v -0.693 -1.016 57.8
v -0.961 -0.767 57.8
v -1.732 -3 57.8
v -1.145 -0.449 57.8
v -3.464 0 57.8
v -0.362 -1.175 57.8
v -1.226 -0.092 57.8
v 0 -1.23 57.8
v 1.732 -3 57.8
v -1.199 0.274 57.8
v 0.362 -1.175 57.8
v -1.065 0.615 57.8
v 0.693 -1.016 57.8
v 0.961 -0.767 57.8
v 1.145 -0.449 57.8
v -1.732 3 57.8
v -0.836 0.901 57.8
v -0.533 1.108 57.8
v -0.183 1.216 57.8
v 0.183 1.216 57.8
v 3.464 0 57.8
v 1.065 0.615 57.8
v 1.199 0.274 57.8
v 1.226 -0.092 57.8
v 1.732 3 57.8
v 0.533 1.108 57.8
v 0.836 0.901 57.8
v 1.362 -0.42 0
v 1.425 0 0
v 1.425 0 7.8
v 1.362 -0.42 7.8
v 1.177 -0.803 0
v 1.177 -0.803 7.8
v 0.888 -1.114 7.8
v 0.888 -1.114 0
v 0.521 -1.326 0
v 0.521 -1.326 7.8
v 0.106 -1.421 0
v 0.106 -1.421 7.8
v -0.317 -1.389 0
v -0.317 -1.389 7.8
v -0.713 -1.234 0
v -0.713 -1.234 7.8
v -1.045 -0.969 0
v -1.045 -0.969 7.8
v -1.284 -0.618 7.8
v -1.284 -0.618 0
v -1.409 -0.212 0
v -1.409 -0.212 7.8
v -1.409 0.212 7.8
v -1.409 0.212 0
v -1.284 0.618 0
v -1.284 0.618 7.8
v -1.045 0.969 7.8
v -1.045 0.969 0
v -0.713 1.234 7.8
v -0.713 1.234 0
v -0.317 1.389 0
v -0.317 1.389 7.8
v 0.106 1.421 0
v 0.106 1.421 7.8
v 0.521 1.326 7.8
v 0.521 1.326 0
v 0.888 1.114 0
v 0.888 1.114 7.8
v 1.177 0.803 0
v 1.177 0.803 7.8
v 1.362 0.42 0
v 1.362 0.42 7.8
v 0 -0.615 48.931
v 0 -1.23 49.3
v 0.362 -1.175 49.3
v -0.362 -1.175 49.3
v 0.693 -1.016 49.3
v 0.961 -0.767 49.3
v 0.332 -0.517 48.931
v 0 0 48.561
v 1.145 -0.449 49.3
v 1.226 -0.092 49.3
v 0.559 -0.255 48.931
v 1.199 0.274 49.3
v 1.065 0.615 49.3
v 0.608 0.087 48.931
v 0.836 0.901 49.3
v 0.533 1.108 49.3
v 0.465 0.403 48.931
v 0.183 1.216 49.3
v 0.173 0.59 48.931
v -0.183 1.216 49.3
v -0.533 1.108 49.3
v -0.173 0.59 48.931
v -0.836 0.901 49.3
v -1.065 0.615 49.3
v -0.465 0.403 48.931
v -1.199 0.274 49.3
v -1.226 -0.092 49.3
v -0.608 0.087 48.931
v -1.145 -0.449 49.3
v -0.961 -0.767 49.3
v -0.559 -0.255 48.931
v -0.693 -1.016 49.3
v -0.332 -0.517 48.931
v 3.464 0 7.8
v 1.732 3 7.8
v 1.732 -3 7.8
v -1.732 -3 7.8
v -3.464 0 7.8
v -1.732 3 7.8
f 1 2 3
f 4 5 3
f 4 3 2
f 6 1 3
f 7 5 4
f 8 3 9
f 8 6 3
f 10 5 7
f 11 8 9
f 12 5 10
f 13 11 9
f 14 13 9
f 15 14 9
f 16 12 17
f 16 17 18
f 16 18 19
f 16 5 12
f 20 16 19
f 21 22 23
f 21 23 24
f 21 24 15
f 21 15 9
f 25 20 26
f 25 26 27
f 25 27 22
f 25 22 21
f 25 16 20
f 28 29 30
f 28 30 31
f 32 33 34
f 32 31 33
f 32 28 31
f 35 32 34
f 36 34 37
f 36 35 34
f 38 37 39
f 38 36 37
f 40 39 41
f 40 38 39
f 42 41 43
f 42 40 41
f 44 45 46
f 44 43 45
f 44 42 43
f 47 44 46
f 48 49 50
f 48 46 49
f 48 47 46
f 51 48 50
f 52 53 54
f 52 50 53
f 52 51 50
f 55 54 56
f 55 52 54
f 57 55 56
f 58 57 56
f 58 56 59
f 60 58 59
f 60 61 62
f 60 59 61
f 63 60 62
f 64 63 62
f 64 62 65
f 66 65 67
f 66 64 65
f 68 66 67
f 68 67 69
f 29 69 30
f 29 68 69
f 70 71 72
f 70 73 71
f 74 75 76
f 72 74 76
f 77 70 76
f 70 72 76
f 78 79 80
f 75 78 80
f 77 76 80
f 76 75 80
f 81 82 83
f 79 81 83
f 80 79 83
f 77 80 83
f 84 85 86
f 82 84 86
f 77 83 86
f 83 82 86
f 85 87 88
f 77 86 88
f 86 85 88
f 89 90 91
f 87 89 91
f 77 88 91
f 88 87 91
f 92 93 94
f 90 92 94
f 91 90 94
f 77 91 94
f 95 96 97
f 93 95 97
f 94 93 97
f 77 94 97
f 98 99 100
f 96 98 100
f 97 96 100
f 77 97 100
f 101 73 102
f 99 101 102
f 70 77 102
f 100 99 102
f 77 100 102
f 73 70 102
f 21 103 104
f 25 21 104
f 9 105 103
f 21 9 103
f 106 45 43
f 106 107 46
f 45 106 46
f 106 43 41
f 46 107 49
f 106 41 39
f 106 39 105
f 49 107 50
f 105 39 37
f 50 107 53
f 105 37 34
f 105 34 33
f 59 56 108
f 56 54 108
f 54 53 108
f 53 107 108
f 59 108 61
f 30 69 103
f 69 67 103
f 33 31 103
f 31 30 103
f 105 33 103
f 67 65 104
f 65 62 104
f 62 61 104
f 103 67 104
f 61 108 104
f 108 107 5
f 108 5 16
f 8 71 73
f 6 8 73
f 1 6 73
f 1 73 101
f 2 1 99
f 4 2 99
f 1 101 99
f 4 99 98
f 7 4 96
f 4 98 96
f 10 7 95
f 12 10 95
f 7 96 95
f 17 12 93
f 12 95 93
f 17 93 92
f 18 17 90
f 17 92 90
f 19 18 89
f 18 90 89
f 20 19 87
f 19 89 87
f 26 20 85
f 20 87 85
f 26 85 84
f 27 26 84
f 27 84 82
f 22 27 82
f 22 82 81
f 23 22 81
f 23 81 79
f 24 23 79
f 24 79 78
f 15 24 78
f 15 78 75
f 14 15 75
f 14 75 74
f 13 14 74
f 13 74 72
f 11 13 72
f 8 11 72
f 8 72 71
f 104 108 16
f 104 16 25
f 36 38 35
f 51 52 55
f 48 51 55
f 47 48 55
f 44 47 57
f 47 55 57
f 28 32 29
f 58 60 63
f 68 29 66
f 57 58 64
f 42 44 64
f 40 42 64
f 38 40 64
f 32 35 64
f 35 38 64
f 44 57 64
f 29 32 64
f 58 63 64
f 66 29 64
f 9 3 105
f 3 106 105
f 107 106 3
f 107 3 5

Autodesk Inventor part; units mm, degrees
ref_plane "Plan YZ" through (0, 0, 0) normal (1, 0, 0) x (0, 1, 0)
ref_plane "Plan XZ" through (0, 0, 0) normal (0, 1, 0) x (-1, 0, 0)
ref_plane "Plan XY" through (0, 0, 0) normal (0, 0, 1) x (1, 0, 0)
sketch "Esquisse1" plane through (0, 0, 0) normal (0, 0, 1) x (1, 0, 0)
  circle A0 centre (0, 0) radius 1.425
  dimension "d0" = 2.85
extrude "Extrusion1" add sketch "Esquisse1" along normal blind 7.8
sketch "Esquisse6" plane through (0, 0, 7.8) normal (0, 0, 1) x (1, 0, 0)
  line L0 (-4.8497, 0) -> (4.8497, 0) construction
  line L1 (0, -4.2) -> (0, 4.2) construction
  line L2 (-1.7321, -3) -> (-3.4641, 0)
  line L3 (-3.4641, 0) -> (-1.7321, 3)
  line L4 (-1.7321, 3) -> (0, 3)
  line L5 (-1.7321, -3) -> (0, -3)
  line L6 (1.7321, -3) -> (3.4641, 0)
  line L7 (3.4641, 0) -> (1.7321, 3)
  line L8 (1.7321, 3) -> (0, 3)
  line L9 (1.7321, -3) -> (0, -3)
  point P0 (0, 0)
  dimension "d4" = 6
  dimension "d8" = 120
  dimension "d10" = 6
extrude "Extrusion2" add sketch "Esquisse6" along normal blind 50
sketch "Esquisse7" plane through (0, 0, 57.8) normal (0, 0, 1) x (1, 0, 0)
  circle A0 centre (0, 0) radius 1.425 projected
thread "Filetage1" size "M3x0.5" class "6g" standard "ISO M" full length
hole "Perçage1" at (0, 0, 57.8) direction (0, 0, -1) diameter 2.459 depth 8.5 tip angle 118 thread size "M3x0.5" class "6H" standard "ISO M"
properties part number "entretoiseM3x50" material "."
